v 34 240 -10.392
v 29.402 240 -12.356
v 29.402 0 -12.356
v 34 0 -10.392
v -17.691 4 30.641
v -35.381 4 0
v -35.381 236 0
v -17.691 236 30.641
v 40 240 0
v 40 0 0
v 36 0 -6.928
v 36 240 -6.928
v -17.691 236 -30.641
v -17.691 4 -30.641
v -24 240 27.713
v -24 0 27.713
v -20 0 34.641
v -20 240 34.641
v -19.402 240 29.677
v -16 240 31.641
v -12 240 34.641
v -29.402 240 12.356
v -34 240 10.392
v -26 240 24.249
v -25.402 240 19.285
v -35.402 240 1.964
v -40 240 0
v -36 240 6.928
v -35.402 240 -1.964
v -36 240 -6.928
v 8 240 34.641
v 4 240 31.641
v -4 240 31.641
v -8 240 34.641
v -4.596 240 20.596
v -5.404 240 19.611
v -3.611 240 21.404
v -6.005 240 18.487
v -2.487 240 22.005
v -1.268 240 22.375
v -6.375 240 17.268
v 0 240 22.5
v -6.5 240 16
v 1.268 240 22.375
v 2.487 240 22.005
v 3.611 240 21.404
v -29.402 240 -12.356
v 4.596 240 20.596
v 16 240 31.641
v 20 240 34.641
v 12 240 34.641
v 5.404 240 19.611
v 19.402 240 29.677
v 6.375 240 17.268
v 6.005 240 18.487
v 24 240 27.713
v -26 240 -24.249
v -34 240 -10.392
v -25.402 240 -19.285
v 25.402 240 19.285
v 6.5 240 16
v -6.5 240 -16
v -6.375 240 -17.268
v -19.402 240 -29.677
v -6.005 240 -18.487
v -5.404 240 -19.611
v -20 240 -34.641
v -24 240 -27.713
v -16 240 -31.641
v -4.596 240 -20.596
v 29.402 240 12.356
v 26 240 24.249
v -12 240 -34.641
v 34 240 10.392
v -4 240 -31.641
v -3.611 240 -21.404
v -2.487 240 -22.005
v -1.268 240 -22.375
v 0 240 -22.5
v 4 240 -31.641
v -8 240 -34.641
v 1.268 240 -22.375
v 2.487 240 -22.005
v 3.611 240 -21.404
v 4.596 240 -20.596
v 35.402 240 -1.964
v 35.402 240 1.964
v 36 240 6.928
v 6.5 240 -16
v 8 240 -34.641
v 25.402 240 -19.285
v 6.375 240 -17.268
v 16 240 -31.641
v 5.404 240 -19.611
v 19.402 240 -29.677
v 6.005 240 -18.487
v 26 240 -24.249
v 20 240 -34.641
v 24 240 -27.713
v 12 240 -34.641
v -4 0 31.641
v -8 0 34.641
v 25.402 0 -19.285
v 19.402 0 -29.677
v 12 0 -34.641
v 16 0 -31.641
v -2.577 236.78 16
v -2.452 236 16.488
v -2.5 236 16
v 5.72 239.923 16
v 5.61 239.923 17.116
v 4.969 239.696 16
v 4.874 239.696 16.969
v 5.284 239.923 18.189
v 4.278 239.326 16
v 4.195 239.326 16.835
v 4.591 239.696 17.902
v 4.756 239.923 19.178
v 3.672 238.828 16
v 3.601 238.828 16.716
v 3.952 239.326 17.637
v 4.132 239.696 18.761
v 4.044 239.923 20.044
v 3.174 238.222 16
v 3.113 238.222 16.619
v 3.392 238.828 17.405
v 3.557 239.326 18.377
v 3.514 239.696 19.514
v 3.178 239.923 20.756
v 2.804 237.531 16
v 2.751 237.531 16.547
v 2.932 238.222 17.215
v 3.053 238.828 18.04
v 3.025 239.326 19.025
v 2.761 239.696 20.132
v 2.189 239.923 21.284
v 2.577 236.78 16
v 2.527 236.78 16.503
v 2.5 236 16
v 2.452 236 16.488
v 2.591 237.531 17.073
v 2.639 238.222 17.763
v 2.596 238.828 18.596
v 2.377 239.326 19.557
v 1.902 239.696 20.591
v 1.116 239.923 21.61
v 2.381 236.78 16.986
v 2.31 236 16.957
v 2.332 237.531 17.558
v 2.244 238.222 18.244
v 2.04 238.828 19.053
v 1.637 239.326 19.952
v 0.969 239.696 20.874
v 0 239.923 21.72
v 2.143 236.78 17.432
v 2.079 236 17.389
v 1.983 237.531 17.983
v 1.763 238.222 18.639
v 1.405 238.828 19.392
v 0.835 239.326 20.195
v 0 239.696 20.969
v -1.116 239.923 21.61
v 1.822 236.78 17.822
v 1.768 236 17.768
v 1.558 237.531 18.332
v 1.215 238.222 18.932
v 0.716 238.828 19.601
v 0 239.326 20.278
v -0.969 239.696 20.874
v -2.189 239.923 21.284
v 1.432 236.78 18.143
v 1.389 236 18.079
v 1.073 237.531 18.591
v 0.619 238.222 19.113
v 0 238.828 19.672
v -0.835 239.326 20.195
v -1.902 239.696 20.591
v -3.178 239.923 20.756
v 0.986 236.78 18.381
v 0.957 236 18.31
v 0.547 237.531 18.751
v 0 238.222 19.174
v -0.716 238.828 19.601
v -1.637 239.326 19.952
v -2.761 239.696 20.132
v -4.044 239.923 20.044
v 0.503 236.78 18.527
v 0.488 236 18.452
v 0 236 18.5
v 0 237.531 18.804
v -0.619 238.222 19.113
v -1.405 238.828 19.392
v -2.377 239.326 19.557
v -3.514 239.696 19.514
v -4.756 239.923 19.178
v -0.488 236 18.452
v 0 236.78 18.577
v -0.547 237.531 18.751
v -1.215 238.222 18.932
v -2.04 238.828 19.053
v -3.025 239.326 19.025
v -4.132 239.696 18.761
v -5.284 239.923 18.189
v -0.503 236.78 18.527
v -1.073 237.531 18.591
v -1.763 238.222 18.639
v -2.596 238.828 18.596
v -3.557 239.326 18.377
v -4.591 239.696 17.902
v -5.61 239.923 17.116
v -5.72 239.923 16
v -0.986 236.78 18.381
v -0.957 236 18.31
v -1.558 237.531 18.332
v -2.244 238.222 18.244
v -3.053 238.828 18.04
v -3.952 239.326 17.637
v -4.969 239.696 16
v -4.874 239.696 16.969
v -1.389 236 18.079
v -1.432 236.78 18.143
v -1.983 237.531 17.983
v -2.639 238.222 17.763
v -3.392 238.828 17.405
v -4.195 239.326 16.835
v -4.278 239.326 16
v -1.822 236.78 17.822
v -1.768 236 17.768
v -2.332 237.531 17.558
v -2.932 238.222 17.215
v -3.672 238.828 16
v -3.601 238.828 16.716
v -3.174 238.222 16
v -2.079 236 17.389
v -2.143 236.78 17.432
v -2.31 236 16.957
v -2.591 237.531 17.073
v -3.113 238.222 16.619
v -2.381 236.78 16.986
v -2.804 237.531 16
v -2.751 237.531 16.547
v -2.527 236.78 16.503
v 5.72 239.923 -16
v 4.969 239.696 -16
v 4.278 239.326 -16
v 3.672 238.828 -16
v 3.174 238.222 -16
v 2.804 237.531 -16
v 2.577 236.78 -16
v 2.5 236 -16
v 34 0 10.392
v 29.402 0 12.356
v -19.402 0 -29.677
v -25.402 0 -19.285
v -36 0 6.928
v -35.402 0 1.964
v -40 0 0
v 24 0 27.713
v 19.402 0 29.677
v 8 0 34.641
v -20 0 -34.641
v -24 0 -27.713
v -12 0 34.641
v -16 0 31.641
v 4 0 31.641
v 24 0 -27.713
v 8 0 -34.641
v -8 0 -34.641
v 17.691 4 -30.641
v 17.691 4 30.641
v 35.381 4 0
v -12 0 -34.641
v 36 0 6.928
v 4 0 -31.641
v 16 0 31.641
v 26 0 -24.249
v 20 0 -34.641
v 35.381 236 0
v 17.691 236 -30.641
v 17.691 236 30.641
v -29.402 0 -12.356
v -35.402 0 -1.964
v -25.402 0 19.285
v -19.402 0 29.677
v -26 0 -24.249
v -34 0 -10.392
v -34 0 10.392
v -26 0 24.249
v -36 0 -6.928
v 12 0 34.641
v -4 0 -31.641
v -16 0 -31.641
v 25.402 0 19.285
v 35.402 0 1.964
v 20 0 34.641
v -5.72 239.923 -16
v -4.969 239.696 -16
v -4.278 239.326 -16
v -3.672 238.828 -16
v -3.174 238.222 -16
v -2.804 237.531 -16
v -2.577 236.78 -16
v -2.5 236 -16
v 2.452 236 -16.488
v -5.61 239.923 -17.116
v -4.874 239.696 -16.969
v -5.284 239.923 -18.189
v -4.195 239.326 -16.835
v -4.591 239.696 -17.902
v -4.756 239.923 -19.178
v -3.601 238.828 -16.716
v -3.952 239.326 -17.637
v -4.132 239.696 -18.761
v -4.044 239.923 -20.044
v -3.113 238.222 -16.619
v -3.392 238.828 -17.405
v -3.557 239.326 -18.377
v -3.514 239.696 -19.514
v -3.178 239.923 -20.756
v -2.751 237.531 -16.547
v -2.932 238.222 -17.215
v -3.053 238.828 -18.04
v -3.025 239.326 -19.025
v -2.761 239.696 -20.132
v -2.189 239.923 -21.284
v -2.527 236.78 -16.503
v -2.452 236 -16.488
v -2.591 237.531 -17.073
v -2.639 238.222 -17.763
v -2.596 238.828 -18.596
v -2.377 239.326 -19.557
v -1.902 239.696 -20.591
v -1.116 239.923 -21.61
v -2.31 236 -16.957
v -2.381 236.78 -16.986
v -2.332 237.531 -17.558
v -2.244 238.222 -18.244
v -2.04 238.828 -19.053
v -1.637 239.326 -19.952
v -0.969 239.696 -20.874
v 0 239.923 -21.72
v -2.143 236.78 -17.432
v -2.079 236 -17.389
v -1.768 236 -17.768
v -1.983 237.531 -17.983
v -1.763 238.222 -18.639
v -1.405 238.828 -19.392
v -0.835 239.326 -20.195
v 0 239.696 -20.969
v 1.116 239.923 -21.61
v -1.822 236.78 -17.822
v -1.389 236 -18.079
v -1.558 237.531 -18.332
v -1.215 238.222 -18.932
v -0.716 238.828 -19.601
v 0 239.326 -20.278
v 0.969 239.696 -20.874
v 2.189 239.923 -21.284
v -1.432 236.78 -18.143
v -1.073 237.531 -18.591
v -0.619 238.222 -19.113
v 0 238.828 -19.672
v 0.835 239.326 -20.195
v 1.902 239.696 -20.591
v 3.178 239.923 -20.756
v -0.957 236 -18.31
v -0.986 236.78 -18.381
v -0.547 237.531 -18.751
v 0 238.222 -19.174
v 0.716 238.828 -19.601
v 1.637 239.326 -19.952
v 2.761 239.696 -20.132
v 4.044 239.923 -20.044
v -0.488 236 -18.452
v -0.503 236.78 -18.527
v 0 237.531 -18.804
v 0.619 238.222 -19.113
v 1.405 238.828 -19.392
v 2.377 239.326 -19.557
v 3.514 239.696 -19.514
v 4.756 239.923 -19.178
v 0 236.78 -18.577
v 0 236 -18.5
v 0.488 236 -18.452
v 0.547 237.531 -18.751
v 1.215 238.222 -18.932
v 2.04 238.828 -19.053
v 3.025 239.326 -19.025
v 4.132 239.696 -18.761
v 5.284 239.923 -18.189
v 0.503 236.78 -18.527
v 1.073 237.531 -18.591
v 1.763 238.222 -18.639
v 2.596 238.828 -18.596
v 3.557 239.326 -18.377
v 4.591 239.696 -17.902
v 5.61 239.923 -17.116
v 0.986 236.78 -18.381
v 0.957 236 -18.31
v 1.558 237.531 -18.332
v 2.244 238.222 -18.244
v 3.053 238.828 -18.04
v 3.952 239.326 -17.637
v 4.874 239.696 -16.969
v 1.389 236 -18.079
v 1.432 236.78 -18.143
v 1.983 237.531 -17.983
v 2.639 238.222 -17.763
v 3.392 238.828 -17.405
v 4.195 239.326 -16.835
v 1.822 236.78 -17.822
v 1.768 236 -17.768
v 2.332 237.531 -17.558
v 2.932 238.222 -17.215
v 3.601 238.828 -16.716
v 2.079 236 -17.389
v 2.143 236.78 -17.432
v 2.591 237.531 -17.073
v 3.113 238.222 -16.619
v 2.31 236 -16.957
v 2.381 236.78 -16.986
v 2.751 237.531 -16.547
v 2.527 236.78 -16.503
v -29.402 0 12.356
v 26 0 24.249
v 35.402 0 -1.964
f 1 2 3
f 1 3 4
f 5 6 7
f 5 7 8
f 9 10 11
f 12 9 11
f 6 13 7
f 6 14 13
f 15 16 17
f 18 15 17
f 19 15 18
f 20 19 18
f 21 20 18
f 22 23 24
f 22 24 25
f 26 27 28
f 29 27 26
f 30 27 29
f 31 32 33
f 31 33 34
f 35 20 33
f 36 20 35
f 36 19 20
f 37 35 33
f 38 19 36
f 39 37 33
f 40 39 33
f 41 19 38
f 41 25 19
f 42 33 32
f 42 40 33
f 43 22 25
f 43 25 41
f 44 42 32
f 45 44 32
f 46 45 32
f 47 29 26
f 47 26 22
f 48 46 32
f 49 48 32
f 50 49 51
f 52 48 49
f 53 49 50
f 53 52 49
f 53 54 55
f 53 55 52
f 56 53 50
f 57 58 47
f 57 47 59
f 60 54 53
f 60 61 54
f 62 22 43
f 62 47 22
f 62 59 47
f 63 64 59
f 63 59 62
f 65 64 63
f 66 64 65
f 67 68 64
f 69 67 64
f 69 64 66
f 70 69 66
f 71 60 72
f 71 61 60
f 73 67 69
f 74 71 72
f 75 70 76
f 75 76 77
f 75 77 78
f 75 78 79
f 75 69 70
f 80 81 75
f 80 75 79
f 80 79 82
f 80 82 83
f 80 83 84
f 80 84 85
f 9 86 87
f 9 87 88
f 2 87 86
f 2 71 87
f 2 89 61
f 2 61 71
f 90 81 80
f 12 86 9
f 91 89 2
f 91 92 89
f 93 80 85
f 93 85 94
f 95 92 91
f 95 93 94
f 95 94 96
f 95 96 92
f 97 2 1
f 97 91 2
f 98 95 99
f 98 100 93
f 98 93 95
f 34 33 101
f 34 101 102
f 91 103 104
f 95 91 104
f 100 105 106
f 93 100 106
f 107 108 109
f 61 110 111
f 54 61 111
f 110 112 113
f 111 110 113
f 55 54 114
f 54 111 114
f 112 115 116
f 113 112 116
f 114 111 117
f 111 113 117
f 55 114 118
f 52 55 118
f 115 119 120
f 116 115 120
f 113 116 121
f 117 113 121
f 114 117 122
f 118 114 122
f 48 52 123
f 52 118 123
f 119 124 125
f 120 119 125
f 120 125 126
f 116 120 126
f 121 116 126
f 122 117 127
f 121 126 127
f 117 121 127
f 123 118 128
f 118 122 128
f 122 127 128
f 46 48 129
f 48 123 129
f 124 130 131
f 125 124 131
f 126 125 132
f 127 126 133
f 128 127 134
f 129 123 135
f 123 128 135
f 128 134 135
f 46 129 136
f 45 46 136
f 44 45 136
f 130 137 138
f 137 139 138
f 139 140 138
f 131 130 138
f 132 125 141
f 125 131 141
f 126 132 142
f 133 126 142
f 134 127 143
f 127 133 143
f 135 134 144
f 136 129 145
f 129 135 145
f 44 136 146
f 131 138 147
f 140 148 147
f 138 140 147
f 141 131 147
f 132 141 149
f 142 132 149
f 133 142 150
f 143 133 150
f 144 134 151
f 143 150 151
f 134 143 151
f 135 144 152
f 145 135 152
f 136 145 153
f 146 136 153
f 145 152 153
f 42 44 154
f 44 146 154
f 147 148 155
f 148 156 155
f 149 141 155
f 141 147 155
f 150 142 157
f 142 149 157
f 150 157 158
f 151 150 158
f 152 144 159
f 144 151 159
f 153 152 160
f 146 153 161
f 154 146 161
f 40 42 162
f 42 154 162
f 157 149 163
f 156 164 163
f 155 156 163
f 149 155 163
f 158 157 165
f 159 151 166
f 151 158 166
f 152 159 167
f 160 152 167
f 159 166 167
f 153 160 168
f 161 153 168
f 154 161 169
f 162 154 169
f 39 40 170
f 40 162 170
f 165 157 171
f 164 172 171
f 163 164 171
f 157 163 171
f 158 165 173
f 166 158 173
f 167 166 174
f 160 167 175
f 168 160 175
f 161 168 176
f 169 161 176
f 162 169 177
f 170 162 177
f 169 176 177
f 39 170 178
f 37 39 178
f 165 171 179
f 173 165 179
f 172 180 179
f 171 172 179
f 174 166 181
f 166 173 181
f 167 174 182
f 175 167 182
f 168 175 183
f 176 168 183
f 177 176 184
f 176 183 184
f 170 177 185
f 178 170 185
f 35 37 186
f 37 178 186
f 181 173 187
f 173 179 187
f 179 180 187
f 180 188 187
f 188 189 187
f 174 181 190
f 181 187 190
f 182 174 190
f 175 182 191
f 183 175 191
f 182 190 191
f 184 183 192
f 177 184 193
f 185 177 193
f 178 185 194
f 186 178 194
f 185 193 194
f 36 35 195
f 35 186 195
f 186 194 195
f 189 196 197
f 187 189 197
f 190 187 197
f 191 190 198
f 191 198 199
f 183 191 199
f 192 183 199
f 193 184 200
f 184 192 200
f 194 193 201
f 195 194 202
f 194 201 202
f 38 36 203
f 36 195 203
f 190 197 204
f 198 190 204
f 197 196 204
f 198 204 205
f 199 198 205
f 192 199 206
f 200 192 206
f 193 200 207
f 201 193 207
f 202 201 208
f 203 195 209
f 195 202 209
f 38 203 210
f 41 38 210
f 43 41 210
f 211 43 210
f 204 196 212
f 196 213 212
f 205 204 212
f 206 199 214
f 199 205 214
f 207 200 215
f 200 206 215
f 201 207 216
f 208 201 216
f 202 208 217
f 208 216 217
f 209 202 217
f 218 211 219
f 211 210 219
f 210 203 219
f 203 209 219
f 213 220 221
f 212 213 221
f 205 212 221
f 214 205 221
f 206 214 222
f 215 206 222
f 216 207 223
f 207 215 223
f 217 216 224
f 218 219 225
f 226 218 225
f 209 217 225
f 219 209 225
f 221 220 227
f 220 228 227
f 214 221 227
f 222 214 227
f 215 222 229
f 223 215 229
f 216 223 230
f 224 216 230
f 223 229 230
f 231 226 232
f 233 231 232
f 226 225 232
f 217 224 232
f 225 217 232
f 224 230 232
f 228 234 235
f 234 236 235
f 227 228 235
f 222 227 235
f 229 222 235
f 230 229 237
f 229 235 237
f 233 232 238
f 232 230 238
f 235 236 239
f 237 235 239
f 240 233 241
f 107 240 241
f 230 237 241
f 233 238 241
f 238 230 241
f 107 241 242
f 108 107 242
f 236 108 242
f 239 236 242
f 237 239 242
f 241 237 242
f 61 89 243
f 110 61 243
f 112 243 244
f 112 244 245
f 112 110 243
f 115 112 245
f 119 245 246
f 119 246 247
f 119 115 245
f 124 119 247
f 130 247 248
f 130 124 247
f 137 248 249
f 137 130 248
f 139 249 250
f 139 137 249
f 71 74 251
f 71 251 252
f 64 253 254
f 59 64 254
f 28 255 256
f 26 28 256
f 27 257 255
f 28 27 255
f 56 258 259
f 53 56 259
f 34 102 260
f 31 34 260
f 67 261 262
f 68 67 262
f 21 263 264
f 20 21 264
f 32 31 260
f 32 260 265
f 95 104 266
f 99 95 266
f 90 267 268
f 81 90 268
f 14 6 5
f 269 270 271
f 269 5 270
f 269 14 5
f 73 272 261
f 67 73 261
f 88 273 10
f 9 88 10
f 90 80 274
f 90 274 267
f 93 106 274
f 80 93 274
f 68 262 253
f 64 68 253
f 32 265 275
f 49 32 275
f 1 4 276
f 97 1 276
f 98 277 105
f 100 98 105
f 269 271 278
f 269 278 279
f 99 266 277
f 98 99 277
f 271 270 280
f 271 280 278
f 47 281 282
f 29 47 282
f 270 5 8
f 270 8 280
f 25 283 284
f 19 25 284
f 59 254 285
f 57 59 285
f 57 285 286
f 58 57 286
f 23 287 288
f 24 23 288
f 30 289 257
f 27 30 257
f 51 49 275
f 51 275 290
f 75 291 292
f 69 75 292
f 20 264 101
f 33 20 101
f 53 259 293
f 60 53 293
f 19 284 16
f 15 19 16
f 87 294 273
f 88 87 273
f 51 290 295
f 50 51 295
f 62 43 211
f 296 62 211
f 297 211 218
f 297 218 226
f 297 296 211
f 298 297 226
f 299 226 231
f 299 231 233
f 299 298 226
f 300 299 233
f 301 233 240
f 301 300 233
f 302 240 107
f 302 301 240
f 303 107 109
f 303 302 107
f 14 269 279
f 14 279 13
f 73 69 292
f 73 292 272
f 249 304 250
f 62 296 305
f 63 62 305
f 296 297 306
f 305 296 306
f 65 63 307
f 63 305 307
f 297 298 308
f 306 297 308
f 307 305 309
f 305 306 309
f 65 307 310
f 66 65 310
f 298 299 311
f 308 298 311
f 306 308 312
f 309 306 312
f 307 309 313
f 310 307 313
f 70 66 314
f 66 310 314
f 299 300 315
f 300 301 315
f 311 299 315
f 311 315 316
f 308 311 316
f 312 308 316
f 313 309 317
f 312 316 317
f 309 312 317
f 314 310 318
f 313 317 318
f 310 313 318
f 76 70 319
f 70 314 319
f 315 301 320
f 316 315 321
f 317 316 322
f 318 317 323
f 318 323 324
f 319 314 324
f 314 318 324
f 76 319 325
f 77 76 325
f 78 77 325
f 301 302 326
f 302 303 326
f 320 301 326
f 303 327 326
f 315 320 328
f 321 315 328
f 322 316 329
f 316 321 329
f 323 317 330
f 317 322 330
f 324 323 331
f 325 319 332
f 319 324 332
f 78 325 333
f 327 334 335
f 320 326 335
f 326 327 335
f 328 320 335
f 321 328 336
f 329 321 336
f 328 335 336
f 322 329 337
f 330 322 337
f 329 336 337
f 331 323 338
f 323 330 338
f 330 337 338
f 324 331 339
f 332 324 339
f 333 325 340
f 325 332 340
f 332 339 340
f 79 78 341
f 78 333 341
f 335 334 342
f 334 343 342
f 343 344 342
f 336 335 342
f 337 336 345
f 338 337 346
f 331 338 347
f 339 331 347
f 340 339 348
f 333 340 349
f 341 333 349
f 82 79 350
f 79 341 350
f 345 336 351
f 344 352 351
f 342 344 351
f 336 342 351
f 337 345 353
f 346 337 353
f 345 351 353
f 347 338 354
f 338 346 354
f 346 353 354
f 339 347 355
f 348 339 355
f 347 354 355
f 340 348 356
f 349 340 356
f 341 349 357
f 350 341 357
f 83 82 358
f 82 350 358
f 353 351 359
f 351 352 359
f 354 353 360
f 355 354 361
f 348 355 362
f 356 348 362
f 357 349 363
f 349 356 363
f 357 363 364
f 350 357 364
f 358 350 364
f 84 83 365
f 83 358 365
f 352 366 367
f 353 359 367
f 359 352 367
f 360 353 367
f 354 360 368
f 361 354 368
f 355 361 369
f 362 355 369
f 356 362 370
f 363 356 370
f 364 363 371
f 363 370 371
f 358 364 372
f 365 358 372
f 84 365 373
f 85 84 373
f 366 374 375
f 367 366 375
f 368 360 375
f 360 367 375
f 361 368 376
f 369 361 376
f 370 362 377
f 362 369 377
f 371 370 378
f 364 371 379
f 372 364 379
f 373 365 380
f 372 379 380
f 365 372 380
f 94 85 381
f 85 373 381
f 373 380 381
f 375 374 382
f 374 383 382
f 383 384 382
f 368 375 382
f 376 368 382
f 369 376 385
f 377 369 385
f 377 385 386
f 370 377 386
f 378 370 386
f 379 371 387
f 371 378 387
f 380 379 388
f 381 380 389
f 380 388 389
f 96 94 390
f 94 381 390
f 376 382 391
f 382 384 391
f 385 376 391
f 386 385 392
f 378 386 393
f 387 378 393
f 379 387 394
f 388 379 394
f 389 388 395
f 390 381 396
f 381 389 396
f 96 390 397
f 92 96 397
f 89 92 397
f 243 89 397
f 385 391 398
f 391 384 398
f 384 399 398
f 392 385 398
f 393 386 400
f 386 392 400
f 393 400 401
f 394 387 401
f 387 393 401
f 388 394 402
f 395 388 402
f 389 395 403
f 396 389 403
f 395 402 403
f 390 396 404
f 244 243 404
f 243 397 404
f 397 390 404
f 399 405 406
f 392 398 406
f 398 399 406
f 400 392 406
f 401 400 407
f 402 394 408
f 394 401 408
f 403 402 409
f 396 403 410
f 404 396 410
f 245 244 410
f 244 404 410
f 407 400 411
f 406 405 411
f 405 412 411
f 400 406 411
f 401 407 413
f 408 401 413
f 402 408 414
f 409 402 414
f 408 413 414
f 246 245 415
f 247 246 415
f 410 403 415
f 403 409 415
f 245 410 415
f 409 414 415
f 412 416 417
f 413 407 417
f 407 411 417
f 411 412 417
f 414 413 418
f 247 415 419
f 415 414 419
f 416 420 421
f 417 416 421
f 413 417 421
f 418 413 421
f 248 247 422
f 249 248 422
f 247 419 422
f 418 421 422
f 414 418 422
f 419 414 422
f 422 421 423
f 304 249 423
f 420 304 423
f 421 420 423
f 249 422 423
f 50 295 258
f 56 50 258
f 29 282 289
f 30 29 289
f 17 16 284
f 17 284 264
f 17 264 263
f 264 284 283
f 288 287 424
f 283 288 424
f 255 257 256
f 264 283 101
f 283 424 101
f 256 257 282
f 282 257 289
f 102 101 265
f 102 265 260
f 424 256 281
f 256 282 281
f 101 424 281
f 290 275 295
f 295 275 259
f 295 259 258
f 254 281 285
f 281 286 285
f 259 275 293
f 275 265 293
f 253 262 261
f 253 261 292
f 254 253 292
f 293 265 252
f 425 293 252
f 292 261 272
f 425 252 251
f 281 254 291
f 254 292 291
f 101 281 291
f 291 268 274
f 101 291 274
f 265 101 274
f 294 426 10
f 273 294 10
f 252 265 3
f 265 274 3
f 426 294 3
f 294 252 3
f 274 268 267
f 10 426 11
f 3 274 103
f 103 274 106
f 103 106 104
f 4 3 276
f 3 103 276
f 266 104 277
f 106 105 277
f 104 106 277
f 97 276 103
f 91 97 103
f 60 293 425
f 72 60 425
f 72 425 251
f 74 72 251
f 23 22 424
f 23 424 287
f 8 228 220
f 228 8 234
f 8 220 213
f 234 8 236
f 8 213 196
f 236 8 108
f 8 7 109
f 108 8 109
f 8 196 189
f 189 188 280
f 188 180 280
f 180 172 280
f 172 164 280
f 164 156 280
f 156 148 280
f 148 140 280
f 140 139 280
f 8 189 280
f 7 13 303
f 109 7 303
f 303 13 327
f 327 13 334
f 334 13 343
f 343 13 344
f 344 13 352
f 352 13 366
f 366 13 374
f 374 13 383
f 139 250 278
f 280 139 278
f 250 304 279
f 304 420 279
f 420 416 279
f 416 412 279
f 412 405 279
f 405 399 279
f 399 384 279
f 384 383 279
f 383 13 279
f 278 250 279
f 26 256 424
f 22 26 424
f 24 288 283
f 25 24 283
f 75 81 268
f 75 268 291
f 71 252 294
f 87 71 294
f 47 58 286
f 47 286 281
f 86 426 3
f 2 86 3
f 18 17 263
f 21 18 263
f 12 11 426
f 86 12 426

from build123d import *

# Parameters (mm, degrees)
BOSS_EXTRUDE1_DEPTH = 240
SHELL1_T            = 4
CUT_EXTRUDE1_DEPTH  = 246.764114549
CUT_EXTRUDE2_REACH  = 247.764
FILLET1_R           = 4


with BuildPart() as part:
    # Sketch1 → Boss-Extrude1 (new body)
    with BuildSketch(Plane(origin=(0, 0, 0), x_dir=(1, 0, 0), z_dir=(0, 1, 0))):
        Polygon((40, 0), (20, 34.641016151), (-20, 34.641016151), (-40, 0), (-20, -34.641016151), (20, -34.641016151), align=None)
    extrude(amount=BOSS_EXTRUDE1_DEPTH)

    # Shell1 (no face opened: a closed hollow body)
    add(offset(amount=-SHELL1_T, mode=Mode.PRIVATE), mode=Mode.SUBTRACT)

    # Sketch2 → Cut-Extrude1 (cut, through all)
    with BuildSketch(Plane.XZ):
        Polygon((-19.401923789, 29.676914536), (-24, 27.712812921), (-26, 24.248711306), (-25.401923789, 19.284609691), align=None)
        Polygon((16, 31.641016151), (12, 34.641016151), (8, 34.641016151), (4, 31.641016151), align=None)
        Polygon((26, 24.248711306), (24, 27.712812921), (19.401923789, 29.676914536), (25.401923789, 19.284609691), align=None)
        Polygon((35.401923789, 1.964101615), (36, 6.92820323), (34, 10.392304845), (29.401923789, 12.356406461), align=None)
        Polygon((34, -10.392304845), (36, -6.92820323), (35.401923789, -1.964101615), (29.401923789, -12.356406461), align=None)
        Polygon((19.401923789, -29.676914536), (24, -27.712812921), (26, -24.248711306), (25.401923789, -19.284609691), align=None)
        Polygon((8, -34.641016151), (12, -34.641016151), (16, -31.641016151), (4, -31.641016151), align=None)
        Polygon((-16, -31.641016151), (-12, -34.641016151), (-8, -34.641016151), (-4, -31.641016151), align=None)
        Polygon((-26, -24.248711306), (-24, -27.712812921), (-19.401923789, -29.676914536), (-25.401923789, -19.284609691), align=None)
        Polygon((-35.401923789, -1.964101615), (-36, -6.92820323), (-34, -10.392304845), (-29.401923789, -12.356406461), align=None)
        Polygon((-34, 10.392304845), (-36, 6.92820323), (-35.401923789, 1.964101615), (-29.401923789, 12.356406461), align=None)
        Polygon((-16, 31.641016151), (-4, 31.641016151), (-8, 34.641016151), (-12, 34.641016151), align=None)
    extrude(amount=-CUT_EXTRUDE1_DEPTH, mode=Mode.SUBTRACT)

    # Sketch3 → Cut-Extrude2 (cut, up to next)
    with BuildSketch(Plane(origin=(0, 240, 0), x_dir=(1, 0, 0), z_dir=(0, 1, 0)), mode=Mode.PRIVATE) as cut_extrude2_sk1:
        with BuildLine():
            Line((2.5, 16), (2.5, -16))
            ThreePointArc((2.5, -16), (0, -18.5), (-2.5, -16))
            Line((-2.5, -16), (-2.5, 16))
            ThreePointArc((-2.5, 16), (0, 18.5), (2.5, 16))
        make_face()
    cut_extrude2_tool1 = extrude(cut_extrude2_sk1.sketch, amount=-CUT_EXTRUDE2_REACH, mode=Mode.PRIVATE) & part.part
    add(cut_extrude2_tool1.solids().sort_by_distance((0, 240, 0))[0], mode=Mode.SUBTRACT)

    # Fillet1
    fillet1_edges = [part.edges().sort_by_distance(p)[0] for p in [
        (0, 240, -18.5),
        (-2.5, 240, 0),
        (0, 240, 18.5),
        (2.5, 240, 0),
    ]]
    fillet(fillet1_edges, radius=FILLET1_R - 0.0001)  # a hair under: the kernel refuses the full size


solid = part.part
